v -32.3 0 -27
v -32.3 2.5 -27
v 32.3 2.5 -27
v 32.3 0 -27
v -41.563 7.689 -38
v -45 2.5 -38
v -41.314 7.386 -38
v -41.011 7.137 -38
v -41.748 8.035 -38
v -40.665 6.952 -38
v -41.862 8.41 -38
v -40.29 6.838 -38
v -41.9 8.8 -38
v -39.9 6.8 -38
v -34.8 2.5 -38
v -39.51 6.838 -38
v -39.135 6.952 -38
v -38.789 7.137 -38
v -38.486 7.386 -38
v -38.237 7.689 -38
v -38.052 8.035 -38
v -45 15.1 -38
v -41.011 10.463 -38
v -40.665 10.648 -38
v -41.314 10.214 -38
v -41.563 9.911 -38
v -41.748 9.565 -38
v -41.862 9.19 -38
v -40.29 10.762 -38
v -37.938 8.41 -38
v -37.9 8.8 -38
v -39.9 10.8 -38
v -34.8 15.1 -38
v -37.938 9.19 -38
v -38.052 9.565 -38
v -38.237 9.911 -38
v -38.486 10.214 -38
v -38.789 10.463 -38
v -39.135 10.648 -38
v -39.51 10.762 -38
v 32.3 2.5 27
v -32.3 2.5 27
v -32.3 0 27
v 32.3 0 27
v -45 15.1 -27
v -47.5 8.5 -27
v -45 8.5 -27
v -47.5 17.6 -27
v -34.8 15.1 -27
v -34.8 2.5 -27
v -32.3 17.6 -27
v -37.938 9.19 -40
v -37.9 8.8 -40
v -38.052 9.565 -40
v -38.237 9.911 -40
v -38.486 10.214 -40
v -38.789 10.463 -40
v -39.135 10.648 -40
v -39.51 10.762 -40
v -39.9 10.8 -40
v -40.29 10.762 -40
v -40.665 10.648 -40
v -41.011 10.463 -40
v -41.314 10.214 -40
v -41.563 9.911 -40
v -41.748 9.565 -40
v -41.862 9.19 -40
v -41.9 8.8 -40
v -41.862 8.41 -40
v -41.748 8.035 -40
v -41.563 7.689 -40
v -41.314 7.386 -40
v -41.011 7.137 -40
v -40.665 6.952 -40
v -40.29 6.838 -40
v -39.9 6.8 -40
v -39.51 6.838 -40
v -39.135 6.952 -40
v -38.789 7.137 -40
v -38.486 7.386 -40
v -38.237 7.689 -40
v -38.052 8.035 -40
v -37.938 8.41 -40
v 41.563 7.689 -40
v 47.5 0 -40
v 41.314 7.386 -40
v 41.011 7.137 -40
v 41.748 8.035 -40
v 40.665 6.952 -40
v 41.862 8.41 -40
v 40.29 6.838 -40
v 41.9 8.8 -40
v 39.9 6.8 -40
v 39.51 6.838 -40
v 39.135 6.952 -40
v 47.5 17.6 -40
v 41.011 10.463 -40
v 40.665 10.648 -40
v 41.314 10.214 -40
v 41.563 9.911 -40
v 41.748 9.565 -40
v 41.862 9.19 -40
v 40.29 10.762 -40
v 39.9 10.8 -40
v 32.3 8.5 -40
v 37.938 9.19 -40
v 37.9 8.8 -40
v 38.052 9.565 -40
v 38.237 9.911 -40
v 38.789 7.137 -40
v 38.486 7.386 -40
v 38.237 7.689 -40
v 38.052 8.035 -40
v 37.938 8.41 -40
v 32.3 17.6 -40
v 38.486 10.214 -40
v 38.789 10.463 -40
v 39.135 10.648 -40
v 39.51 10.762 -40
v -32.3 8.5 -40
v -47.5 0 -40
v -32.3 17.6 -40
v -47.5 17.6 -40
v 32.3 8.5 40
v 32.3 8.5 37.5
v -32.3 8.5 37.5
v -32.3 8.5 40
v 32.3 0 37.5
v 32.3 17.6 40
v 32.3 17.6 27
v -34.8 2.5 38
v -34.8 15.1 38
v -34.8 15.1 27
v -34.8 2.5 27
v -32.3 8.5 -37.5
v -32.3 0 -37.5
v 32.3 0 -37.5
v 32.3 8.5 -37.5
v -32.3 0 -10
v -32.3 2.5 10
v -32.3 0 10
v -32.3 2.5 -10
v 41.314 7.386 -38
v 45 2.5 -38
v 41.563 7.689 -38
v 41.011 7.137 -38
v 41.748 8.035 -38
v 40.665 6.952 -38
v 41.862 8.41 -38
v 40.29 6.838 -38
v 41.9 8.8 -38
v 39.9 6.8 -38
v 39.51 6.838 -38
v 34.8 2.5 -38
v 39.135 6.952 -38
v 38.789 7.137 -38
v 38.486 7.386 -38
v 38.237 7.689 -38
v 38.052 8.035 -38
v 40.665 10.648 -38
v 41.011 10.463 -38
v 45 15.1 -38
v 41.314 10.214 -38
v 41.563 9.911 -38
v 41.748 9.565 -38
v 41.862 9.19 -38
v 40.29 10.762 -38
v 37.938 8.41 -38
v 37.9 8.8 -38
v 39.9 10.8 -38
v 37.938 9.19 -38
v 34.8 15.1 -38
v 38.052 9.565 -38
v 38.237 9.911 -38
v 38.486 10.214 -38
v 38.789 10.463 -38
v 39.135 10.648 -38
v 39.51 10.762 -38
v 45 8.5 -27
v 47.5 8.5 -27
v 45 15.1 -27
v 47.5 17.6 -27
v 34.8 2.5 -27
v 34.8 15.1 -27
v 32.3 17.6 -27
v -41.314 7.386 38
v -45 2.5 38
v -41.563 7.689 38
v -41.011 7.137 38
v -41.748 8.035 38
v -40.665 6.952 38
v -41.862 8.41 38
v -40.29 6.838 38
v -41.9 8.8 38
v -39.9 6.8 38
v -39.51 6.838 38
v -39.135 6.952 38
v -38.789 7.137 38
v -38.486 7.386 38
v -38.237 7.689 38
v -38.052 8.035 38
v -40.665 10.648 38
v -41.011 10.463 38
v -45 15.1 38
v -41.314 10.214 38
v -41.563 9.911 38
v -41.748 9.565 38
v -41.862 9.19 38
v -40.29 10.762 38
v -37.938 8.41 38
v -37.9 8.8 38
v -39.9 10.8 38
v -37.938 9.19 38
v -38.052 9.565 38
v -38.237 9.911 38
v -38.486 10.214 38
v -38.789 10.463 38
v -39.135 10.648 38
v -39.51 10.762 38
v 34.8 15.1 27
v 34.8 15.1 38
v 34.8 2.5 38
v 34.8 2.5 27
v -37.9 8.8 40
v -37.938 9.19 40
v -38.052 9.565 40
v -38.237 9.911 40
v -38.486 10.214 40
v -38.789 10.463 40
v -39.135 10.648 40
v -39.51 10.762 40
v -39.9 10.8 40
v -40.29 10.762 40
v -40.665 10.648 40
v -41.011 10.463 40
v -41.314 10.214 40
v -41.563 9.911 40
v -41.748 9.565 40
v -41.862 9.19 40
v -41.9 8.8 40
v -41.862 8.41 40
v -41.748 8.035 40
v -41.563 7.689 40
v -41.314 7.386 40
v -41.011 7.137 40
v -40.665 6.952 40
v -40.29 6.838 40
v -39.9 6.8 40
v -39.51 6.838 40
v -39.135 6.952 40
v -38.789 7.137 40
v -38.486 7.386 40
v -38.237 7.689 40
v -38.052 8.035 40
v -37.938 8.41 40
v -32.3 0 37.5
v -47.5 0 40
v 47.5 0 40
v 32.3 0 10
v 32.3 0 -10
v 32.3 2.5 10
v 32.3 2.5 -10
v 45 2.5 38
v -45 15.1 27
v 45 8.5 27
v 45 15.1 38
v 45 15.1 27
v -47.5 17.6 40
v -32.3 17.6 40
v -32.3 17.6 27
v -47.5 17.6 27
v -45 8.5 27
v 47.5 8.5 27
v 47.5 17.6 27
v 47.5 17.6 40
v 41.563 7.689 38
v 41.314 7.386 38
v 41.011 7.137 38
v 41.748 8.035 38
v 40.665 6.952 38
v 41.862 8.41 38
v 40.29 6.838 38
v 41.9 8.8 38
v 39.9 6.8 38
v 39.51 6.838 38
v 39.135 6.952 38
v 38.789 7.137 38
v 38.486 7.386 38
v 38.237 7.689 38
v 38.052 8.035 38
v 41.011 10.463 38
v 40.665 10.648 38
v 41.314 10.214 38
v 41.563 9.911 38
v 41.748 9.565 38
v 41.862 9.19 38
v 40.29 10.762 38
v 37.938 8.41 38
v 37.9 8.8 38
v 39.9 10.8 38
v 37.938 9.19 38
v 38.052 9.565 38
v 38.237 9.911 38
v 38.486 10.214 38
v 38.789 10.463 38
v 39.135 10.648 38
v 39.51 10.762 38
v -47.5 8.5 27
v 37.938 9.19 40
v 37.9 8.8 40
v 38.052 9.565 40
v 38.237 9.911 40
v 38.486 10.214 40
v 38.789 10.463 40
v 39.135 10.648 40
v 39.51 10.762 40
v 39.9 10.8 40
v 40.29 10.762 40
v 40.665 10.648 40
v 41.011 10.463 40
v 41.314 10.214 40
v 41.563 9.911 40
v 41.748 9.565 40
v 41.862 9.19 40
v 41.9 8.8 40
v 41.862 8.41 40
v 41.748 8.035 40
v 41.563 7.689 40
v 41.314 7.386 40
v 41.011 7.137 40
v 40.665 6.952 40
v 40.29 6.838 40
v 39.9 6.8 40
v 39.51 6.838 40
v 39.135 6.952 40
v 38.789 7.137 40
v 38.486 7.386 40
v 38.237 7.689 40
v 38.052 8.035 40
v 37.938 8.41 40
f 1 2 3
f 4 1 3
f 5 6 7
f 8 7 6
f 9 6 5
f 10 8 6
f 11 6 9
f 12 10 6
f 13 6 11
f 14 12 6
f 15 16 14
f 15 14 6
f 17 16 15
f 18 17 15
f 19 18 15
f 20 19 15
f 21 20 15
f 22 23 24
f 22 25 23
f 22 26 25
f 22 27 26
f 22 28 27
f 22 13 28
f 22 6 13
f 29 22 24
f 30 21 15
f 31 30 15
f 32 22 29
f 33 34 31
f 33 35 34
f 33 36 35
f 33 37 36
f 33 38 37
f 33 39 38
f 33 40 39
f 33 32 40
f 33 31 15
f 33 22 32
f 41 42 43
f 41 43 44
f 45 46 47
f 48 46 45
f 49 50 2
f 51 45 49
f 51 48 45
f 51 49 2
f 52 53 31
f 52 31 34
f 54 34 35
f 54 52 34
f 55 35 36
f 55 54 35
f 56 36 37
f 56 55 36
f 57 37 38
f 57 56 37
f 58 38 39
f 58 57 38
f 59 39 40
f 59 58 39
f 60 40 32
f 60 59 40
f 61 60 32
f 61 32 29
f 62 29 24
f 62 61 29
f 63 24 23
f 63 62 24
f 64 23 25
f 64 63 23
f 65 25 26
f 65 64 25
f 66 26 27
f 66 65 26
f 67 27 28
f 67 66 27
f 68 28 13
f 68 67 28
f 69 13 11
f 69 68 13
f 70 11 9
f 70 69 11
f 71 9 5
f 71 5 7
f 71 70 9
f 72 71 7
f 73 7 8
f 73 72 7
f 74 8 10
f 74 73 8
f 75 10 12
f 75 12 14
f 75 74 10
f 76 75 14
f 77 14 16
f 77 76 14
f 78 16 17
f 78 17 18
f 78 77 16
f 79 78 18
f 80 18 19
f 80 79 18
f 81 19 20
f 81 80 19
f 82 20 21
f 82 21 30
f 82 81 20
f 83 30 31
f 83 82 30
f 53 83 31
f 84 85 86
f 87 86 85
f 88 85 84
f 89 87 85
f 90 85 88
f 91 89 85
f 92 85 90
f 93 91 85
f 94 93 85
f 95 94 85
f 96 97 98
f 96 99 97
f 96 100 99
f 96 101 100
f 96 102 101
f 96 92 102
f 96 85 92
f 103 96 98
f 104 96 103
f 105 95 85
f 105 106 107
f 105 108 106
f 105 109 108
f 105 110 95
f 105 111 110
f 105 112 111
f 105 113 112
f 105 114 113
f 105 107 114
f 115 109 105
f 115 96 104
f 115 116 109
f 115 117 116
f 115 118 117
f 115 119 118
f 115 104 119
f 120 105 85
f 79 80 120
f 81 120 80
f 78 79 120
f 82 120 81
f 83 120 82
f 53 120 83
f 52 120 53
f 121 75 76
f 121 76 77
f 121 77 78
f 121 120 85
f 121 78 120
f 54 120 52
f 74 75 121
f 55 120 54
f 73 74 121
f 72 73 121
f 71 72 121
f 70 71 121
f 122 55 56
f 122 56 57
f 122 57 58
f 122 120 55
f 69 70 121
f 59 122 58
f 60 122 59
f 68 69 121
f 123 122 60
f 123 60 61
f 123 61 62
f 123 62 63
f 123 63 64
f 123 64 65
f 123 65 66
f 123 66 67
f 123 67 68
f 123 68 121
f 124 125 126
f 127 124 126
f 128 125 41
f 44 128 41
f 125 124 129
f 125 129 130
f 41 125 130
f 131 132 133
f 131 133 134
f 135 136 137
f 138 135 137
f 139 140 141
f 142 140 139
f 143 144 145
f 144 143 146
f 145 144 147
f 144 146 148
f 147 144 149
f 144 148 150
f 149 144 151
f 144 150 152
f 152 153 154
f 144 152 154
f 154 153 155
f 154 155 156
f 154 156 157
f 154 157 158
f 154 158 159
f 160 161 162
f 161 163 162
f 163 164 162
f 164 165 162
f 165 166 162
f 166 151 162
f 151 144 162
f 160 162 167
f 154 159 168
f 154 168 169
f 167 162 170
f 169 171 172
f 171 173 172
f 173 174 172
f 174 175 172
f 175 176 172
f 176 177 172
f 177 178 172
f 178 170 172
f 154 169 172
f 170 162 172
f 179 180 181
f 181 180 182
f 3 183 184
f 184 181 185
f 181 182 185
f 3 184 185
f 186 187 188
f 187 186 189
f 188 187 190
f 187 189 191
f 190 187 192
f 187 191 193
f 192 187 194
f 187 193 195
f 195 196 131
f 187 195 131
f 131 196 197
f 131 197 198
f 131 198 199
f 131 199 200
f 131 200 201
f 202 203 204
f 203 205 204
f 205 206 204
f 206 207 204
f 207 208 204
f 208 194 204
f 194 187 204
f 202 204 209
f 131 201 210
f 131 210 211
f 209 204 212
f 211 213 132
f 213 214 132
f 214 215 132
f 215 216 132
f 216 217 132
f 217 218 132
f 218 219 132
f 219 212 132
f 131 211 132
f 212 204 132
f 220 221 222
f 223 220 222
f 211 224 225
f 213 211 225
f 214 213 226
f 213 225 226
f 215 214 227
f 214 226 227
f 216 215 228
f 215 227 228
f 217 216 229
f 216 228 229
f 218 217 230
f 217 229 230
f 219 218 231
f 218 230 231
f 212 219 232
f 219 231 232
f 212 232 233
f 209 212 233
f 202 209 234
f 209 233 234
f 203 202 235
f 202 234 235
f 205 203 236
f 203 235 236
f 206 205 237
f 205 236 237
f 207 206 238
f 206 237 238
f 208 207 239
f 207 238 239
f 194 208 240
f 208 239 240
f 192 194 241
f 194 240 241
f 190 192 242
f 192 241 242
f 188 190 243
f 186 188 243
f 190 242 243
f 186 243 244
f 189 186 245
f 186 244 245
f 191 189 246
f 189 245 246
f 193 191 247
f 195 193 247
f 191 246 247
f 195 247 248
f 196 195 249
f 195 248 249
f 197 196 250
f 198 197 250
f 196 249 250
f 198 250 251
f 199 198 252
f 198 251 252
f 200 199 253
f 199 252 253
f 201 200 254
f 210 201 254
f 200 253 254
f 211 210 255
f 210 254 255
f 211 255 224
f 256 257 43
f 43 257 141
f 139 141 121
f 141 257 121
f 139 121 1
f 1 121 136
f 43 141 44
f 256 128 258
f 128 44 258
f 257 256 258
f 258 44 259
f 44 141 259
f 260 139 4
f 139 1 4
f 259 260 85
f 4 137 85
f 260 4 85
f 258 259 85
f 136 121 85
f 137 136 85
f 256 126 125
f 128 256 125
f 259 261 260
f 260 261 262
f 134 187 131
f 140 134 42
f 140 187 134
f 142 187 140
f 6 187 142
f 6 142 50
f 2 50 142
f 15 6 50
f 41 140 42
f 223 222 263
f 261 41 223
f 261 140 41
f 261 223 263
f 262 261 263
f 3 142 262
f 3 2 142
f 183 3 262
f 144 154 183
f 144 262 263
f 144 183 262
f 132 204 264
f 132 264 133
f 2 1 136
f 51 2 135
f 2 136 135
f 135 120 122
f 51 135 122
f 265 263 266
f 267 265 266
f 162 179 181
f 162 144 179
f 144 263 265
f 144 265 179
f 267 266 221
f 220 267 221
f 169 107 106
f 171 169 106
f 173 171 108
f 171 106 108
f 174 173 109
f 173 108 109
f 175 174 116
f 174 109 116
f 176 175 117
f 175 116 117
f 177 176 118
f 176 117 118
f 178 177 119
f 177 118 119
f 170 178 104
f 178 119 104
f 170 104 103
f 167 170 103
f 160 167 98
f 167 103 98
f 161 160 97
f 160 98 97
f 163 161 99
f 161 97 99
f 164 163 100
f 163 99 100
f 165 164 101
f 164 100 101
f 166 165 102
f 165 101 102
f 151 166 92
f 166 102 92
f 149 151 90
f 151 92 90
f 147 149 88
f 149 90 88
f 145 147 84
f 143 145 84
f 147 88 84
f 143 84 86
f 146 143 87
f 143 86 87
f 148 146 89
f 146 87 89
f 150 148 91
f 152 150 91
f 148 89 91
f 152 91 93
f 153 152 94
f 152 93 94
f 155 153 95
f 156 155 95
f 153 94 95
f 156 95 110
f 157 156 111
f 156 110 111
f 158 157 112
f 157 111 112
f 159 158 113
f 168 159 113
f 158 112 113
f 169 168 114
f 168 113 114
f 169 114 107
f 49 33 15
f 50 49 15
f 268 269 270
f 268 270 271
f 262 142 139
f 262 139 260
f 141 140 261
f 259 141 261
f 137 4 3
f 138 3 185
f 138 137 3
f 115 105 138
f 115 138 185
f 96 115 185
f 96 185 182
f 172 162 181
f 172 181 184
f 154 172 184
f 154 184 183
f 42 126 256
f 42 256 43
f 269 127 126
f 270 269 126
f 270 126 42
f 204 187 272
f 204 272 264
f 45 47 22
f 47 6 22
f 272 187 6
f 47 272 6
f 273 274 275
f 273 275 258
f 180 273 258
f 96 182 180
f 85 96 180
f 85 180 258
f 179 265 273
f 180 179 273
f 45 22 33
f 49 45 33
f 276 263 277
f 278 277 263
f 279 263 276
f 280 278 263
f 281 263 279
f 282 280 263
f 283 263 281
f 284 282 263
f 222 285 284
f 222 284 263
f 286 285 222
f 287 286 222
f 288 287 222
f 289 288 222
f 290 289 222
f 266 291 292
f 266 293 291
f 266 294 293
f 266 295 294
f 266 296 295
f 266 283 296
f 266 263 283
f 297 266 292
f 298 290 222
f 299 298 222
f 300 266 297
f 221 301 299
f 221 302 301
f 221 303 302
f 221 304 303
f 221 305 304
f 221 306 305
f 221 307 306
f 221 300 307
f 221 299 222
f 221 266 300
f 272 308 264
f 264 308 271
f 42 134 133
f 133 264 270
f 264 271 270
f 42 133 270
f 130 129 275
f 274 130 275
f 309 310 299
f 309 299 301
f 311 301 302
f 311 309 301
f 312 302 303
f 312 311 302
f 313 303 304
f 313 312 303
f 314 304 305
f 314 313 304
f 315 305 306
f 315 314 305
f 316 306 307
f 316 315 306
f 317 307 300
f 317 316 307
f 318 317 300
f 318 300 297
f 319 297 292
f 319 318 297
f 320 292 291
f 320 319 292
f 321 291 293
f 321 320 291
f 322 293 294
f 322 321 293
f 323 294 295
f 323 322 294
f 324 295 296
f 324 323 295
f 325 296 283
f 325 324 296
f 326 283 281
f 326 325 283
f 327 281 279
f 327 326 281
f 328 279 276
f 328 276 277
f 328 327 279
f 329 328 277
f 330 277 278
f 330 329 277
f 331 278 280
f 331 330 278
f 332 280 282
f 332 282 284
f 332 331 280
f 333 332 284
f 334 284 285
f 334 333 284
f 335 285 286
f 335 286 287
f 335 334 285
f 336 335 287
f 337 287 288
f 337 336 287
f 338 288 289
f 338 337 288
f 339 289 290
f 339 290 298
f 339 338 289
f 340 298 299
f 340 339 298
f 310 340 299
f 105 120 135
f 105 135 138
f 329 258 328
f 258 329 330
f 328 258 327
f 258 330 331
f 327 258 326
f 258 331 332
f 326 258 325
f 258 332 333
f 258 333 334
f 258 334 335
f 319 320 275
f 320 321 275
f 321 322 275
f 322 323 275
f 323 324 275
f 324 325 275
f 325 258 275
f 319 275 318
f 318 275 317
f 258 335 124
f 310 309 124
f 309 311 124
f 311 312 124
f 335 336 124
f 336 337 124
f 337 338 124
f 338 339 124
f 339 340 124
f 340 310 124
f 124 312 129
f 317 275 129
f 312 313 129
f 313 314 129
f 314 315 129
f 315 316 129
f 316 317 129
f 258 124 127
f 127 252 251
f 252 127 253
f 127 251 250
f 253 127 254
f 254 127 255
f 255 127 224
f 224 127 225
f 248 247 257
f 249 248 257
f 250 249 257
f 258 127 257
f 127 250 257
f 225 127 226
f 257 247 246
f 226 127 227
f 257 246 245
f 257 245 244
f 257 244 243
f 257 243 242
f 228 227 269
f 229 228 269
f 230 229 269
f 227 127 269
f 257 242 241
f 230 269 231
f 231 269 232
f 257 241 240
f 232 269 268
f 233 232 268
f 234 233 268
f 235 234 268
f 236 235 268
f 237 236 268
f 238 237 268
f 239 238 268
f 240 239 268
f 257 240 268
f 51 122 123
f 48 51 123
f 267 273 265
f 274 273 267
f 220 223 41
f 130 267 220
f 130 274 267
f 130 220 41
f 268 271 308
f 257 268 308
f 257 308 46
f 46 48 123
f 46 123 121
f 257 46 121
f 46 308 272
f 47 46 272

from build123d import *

# Parameters (mm, degrees)
SKETCH1_W                                  = 90
SKETCH1_H                                  = 80
BOSS_EXTRUDE1_DEPTH                        = 2.5
BOSS_EXTRUDE2_DEPTH                        = 13
SKETCH2_3_W                                = 10.2
SKETCH2_3_H                                = 12.6
SKETCH2_3_R                                = 2
BOSS_EXTRUDE3_DEPTH                        = 2
MIRROR1_AT_THE_SECOND_PLANE_COPY_1_DEPTH   = 13
MIRROR1_AT_THE_SECOND_PLANE_COPY_2_SKETC_W = 10.2
MIRROR1_AT_THE_SECOND_PLANE_COPY_2_SKETC_H = 12.6
MIRROR1_AT_THE_SECOND_PLANE_COPY_2_SKETC_R = 2
MIRROR1_AT_THE_SECOND_PLANE_COPY_2_DEPTH   = 2
BOSS_EXTRUDE4_DEPTH                        = 6
BOSS_EXTRUDE4_DEPTH_BACK                   = 2.5
SKETCH4_W                                  = 2.5
SKETCH4_H                                  = 54
SKETCH5_W                                  = 64.6
SKETCH5_H                                  = 10.5
SKETCH5_H_2                                = 20
CUT_EXTRUDE1_DEPTH                         = 64.908215434


with BuildPart() as part:
    # Sketch1 → Boss-Extrude1 (new body)
    with BuildSketch(Plane(origin=(0, 0, 0), x_dir=(1, 0, 0), z_dir=(0, 1, 0))):
        Rectangle(SKETCH1_W, SKETCH1_H)
    extrude(amount=BOSS_EXTRUDE1_DEPTH)

    # Sketch2 → Boss-Extrude2 (add)
    with BuildSketch(Plane.XY.offset(40)):
        Polygon((-45, 15.1), (-34.8, 15.1), (-34.8, 2.5), (-32.3, 2.5), (-32.3, 17.6), (-47.5, 17.6), (-47.5, 0), (-45, 0), (-45, 2.5), align=None)
    boss_extrude2 = extrude(amount=-BOSS_EXTRUDE2_DEPTH)

    # Sketch2<3> → Boss-Extrude3 (add)
    with BuildSketch(Plane.XY.offset(40)):
        with Locations((-39.9, 8.8)):
            Rectangle(SKETCH2_3_W, SKETCH2_3_H)
        with Locations((-39.9, 8.8)):
            Circle(SKETCH2_3_R, mode=Mode.SUBTRACT)
    boss_extrude3 = extrude(amount=-BOSS_EXTRUDE3_DEPTH)

    # Mirror1: Boss-Extrude2, Boss-Extrude3 across plane
    add(boss_extrude2.mirror(Plane.XY))
    add(boss_extrude3.mirror(Plane.XY))

    # Mirror1 at the second plane: Boss-Extrude2, Boss-Extrude3 across plane
    add(boss_extrude2.mirror(Plane(origin=(0, 0, 0), x_dir=(0, 0, 1), z_dir=(1, 0, 0))))
    add(boss_extrude3.mirror(Plane(origin=(0, 0, 0), x_dir=(0, 0, 1), z_dir=(1, 0, 0))))

    # Mirror1 at the second plane copy 1 sketc → Mirror1 at the second plane copy 1 (add)
    with BuildSketch(Plane(origin=(0, 0, -40), x_dir=(-1, 0, 0), z_dir=(0, 0, -1))):
        Polygon((-45, 15.1), (-34.8, 15.1), (-34.8, 2.5), (-32.3, 2.5), (-32.3, 17.6), (-47.5, 17.6), (-47.5, 0), (-45, 0), (-45, 2.5), align=None)
    extrude(amount=-MIRROR1_AT_THE_SECOND_PLANE_COPY_1_DEPTH)

    # Mirror1 at the second plane copy 2 sketc → Mirror1 at the second plane copy 2 (add)
    with BuildSketch(Plane(origin=(0, 0, -40), x_dir=(-1, 0, 0), z_dir=(0, 0, -1))):
        with Locations((-39.9, 8.8)):
            Rectangle(MIRROR1_AT_THE_SECOND_PLANE_COPY_2_SKETC_W, MIRROR1_AT_THE_SECOND_PLANE_COPY_2_SKETC_H)
        with Locations((-39.9, 8.8)):
            Circle(MIRROR1_AT_THE_SECOND_PLANE_COPY_2_SKETC_R, mode=Mode.SUBTRACT)
    extrude(amount=-MIRROR1_AT_THE_SECOND_PLANE_COPY_2_DEPTH)

    # Sketch4 → Boss-Extrude4 (add, two sides: drawn at the far end of the back side and taken through both)
    with BuildSketch(Plane(origin=(0, 2.5, 0), x_dir=(1, 0, 0), z_dir=(0, 1, 0)).offset(-BOSS_EXTRUDE4_DEPTH_BACK)):
        Polygon((32.3, 37.5), (32.3, 40), (-32.3, 40), (-32.3, 37.5), (-29.8, 37.5), (29.8, 37.5), align=None)
        Polygon((32.3, -37.5), (32.3, -40), (-32.3, -40), (-32.3, -37.5), (-29.8, -37.5), (29.8, -37.5), align=None)
        with Locations((46.25, 0)):
            Rectangle(SKETCH4_W, SKETCH4_H)
        with Locations((-46.25, 0)):
            Rectangle(SKETCH4_W, SKETCH4_H)
    extrude(amount=BOSS_EXTRUDE4_DEPTH + BOSS_EXTRUDE4_DEPTH_BACK)

    # Sketch5 → Cut-Extrude1 (cut, through all)
    with BuildSketch(Plane(origin=(0, 2.5, 0), x_dir=(1, 0, 0), z_dir=(0, 1, 0))):
        with Locations((0, -32.25)):
            Rectangle(SKETCH5_W, SKETCH5_H)
        with Locations((0, 32.25)):
            Rectangle(SKETCH5_W, SKETCH5_H)
        Rectangle(SKETCH5_W, SKETCH5_H_2)
    extrude(amount=-CUT_EXTRUDE1_DEPTH, mode=Mode.SUBTRACT)


solid = part.part
